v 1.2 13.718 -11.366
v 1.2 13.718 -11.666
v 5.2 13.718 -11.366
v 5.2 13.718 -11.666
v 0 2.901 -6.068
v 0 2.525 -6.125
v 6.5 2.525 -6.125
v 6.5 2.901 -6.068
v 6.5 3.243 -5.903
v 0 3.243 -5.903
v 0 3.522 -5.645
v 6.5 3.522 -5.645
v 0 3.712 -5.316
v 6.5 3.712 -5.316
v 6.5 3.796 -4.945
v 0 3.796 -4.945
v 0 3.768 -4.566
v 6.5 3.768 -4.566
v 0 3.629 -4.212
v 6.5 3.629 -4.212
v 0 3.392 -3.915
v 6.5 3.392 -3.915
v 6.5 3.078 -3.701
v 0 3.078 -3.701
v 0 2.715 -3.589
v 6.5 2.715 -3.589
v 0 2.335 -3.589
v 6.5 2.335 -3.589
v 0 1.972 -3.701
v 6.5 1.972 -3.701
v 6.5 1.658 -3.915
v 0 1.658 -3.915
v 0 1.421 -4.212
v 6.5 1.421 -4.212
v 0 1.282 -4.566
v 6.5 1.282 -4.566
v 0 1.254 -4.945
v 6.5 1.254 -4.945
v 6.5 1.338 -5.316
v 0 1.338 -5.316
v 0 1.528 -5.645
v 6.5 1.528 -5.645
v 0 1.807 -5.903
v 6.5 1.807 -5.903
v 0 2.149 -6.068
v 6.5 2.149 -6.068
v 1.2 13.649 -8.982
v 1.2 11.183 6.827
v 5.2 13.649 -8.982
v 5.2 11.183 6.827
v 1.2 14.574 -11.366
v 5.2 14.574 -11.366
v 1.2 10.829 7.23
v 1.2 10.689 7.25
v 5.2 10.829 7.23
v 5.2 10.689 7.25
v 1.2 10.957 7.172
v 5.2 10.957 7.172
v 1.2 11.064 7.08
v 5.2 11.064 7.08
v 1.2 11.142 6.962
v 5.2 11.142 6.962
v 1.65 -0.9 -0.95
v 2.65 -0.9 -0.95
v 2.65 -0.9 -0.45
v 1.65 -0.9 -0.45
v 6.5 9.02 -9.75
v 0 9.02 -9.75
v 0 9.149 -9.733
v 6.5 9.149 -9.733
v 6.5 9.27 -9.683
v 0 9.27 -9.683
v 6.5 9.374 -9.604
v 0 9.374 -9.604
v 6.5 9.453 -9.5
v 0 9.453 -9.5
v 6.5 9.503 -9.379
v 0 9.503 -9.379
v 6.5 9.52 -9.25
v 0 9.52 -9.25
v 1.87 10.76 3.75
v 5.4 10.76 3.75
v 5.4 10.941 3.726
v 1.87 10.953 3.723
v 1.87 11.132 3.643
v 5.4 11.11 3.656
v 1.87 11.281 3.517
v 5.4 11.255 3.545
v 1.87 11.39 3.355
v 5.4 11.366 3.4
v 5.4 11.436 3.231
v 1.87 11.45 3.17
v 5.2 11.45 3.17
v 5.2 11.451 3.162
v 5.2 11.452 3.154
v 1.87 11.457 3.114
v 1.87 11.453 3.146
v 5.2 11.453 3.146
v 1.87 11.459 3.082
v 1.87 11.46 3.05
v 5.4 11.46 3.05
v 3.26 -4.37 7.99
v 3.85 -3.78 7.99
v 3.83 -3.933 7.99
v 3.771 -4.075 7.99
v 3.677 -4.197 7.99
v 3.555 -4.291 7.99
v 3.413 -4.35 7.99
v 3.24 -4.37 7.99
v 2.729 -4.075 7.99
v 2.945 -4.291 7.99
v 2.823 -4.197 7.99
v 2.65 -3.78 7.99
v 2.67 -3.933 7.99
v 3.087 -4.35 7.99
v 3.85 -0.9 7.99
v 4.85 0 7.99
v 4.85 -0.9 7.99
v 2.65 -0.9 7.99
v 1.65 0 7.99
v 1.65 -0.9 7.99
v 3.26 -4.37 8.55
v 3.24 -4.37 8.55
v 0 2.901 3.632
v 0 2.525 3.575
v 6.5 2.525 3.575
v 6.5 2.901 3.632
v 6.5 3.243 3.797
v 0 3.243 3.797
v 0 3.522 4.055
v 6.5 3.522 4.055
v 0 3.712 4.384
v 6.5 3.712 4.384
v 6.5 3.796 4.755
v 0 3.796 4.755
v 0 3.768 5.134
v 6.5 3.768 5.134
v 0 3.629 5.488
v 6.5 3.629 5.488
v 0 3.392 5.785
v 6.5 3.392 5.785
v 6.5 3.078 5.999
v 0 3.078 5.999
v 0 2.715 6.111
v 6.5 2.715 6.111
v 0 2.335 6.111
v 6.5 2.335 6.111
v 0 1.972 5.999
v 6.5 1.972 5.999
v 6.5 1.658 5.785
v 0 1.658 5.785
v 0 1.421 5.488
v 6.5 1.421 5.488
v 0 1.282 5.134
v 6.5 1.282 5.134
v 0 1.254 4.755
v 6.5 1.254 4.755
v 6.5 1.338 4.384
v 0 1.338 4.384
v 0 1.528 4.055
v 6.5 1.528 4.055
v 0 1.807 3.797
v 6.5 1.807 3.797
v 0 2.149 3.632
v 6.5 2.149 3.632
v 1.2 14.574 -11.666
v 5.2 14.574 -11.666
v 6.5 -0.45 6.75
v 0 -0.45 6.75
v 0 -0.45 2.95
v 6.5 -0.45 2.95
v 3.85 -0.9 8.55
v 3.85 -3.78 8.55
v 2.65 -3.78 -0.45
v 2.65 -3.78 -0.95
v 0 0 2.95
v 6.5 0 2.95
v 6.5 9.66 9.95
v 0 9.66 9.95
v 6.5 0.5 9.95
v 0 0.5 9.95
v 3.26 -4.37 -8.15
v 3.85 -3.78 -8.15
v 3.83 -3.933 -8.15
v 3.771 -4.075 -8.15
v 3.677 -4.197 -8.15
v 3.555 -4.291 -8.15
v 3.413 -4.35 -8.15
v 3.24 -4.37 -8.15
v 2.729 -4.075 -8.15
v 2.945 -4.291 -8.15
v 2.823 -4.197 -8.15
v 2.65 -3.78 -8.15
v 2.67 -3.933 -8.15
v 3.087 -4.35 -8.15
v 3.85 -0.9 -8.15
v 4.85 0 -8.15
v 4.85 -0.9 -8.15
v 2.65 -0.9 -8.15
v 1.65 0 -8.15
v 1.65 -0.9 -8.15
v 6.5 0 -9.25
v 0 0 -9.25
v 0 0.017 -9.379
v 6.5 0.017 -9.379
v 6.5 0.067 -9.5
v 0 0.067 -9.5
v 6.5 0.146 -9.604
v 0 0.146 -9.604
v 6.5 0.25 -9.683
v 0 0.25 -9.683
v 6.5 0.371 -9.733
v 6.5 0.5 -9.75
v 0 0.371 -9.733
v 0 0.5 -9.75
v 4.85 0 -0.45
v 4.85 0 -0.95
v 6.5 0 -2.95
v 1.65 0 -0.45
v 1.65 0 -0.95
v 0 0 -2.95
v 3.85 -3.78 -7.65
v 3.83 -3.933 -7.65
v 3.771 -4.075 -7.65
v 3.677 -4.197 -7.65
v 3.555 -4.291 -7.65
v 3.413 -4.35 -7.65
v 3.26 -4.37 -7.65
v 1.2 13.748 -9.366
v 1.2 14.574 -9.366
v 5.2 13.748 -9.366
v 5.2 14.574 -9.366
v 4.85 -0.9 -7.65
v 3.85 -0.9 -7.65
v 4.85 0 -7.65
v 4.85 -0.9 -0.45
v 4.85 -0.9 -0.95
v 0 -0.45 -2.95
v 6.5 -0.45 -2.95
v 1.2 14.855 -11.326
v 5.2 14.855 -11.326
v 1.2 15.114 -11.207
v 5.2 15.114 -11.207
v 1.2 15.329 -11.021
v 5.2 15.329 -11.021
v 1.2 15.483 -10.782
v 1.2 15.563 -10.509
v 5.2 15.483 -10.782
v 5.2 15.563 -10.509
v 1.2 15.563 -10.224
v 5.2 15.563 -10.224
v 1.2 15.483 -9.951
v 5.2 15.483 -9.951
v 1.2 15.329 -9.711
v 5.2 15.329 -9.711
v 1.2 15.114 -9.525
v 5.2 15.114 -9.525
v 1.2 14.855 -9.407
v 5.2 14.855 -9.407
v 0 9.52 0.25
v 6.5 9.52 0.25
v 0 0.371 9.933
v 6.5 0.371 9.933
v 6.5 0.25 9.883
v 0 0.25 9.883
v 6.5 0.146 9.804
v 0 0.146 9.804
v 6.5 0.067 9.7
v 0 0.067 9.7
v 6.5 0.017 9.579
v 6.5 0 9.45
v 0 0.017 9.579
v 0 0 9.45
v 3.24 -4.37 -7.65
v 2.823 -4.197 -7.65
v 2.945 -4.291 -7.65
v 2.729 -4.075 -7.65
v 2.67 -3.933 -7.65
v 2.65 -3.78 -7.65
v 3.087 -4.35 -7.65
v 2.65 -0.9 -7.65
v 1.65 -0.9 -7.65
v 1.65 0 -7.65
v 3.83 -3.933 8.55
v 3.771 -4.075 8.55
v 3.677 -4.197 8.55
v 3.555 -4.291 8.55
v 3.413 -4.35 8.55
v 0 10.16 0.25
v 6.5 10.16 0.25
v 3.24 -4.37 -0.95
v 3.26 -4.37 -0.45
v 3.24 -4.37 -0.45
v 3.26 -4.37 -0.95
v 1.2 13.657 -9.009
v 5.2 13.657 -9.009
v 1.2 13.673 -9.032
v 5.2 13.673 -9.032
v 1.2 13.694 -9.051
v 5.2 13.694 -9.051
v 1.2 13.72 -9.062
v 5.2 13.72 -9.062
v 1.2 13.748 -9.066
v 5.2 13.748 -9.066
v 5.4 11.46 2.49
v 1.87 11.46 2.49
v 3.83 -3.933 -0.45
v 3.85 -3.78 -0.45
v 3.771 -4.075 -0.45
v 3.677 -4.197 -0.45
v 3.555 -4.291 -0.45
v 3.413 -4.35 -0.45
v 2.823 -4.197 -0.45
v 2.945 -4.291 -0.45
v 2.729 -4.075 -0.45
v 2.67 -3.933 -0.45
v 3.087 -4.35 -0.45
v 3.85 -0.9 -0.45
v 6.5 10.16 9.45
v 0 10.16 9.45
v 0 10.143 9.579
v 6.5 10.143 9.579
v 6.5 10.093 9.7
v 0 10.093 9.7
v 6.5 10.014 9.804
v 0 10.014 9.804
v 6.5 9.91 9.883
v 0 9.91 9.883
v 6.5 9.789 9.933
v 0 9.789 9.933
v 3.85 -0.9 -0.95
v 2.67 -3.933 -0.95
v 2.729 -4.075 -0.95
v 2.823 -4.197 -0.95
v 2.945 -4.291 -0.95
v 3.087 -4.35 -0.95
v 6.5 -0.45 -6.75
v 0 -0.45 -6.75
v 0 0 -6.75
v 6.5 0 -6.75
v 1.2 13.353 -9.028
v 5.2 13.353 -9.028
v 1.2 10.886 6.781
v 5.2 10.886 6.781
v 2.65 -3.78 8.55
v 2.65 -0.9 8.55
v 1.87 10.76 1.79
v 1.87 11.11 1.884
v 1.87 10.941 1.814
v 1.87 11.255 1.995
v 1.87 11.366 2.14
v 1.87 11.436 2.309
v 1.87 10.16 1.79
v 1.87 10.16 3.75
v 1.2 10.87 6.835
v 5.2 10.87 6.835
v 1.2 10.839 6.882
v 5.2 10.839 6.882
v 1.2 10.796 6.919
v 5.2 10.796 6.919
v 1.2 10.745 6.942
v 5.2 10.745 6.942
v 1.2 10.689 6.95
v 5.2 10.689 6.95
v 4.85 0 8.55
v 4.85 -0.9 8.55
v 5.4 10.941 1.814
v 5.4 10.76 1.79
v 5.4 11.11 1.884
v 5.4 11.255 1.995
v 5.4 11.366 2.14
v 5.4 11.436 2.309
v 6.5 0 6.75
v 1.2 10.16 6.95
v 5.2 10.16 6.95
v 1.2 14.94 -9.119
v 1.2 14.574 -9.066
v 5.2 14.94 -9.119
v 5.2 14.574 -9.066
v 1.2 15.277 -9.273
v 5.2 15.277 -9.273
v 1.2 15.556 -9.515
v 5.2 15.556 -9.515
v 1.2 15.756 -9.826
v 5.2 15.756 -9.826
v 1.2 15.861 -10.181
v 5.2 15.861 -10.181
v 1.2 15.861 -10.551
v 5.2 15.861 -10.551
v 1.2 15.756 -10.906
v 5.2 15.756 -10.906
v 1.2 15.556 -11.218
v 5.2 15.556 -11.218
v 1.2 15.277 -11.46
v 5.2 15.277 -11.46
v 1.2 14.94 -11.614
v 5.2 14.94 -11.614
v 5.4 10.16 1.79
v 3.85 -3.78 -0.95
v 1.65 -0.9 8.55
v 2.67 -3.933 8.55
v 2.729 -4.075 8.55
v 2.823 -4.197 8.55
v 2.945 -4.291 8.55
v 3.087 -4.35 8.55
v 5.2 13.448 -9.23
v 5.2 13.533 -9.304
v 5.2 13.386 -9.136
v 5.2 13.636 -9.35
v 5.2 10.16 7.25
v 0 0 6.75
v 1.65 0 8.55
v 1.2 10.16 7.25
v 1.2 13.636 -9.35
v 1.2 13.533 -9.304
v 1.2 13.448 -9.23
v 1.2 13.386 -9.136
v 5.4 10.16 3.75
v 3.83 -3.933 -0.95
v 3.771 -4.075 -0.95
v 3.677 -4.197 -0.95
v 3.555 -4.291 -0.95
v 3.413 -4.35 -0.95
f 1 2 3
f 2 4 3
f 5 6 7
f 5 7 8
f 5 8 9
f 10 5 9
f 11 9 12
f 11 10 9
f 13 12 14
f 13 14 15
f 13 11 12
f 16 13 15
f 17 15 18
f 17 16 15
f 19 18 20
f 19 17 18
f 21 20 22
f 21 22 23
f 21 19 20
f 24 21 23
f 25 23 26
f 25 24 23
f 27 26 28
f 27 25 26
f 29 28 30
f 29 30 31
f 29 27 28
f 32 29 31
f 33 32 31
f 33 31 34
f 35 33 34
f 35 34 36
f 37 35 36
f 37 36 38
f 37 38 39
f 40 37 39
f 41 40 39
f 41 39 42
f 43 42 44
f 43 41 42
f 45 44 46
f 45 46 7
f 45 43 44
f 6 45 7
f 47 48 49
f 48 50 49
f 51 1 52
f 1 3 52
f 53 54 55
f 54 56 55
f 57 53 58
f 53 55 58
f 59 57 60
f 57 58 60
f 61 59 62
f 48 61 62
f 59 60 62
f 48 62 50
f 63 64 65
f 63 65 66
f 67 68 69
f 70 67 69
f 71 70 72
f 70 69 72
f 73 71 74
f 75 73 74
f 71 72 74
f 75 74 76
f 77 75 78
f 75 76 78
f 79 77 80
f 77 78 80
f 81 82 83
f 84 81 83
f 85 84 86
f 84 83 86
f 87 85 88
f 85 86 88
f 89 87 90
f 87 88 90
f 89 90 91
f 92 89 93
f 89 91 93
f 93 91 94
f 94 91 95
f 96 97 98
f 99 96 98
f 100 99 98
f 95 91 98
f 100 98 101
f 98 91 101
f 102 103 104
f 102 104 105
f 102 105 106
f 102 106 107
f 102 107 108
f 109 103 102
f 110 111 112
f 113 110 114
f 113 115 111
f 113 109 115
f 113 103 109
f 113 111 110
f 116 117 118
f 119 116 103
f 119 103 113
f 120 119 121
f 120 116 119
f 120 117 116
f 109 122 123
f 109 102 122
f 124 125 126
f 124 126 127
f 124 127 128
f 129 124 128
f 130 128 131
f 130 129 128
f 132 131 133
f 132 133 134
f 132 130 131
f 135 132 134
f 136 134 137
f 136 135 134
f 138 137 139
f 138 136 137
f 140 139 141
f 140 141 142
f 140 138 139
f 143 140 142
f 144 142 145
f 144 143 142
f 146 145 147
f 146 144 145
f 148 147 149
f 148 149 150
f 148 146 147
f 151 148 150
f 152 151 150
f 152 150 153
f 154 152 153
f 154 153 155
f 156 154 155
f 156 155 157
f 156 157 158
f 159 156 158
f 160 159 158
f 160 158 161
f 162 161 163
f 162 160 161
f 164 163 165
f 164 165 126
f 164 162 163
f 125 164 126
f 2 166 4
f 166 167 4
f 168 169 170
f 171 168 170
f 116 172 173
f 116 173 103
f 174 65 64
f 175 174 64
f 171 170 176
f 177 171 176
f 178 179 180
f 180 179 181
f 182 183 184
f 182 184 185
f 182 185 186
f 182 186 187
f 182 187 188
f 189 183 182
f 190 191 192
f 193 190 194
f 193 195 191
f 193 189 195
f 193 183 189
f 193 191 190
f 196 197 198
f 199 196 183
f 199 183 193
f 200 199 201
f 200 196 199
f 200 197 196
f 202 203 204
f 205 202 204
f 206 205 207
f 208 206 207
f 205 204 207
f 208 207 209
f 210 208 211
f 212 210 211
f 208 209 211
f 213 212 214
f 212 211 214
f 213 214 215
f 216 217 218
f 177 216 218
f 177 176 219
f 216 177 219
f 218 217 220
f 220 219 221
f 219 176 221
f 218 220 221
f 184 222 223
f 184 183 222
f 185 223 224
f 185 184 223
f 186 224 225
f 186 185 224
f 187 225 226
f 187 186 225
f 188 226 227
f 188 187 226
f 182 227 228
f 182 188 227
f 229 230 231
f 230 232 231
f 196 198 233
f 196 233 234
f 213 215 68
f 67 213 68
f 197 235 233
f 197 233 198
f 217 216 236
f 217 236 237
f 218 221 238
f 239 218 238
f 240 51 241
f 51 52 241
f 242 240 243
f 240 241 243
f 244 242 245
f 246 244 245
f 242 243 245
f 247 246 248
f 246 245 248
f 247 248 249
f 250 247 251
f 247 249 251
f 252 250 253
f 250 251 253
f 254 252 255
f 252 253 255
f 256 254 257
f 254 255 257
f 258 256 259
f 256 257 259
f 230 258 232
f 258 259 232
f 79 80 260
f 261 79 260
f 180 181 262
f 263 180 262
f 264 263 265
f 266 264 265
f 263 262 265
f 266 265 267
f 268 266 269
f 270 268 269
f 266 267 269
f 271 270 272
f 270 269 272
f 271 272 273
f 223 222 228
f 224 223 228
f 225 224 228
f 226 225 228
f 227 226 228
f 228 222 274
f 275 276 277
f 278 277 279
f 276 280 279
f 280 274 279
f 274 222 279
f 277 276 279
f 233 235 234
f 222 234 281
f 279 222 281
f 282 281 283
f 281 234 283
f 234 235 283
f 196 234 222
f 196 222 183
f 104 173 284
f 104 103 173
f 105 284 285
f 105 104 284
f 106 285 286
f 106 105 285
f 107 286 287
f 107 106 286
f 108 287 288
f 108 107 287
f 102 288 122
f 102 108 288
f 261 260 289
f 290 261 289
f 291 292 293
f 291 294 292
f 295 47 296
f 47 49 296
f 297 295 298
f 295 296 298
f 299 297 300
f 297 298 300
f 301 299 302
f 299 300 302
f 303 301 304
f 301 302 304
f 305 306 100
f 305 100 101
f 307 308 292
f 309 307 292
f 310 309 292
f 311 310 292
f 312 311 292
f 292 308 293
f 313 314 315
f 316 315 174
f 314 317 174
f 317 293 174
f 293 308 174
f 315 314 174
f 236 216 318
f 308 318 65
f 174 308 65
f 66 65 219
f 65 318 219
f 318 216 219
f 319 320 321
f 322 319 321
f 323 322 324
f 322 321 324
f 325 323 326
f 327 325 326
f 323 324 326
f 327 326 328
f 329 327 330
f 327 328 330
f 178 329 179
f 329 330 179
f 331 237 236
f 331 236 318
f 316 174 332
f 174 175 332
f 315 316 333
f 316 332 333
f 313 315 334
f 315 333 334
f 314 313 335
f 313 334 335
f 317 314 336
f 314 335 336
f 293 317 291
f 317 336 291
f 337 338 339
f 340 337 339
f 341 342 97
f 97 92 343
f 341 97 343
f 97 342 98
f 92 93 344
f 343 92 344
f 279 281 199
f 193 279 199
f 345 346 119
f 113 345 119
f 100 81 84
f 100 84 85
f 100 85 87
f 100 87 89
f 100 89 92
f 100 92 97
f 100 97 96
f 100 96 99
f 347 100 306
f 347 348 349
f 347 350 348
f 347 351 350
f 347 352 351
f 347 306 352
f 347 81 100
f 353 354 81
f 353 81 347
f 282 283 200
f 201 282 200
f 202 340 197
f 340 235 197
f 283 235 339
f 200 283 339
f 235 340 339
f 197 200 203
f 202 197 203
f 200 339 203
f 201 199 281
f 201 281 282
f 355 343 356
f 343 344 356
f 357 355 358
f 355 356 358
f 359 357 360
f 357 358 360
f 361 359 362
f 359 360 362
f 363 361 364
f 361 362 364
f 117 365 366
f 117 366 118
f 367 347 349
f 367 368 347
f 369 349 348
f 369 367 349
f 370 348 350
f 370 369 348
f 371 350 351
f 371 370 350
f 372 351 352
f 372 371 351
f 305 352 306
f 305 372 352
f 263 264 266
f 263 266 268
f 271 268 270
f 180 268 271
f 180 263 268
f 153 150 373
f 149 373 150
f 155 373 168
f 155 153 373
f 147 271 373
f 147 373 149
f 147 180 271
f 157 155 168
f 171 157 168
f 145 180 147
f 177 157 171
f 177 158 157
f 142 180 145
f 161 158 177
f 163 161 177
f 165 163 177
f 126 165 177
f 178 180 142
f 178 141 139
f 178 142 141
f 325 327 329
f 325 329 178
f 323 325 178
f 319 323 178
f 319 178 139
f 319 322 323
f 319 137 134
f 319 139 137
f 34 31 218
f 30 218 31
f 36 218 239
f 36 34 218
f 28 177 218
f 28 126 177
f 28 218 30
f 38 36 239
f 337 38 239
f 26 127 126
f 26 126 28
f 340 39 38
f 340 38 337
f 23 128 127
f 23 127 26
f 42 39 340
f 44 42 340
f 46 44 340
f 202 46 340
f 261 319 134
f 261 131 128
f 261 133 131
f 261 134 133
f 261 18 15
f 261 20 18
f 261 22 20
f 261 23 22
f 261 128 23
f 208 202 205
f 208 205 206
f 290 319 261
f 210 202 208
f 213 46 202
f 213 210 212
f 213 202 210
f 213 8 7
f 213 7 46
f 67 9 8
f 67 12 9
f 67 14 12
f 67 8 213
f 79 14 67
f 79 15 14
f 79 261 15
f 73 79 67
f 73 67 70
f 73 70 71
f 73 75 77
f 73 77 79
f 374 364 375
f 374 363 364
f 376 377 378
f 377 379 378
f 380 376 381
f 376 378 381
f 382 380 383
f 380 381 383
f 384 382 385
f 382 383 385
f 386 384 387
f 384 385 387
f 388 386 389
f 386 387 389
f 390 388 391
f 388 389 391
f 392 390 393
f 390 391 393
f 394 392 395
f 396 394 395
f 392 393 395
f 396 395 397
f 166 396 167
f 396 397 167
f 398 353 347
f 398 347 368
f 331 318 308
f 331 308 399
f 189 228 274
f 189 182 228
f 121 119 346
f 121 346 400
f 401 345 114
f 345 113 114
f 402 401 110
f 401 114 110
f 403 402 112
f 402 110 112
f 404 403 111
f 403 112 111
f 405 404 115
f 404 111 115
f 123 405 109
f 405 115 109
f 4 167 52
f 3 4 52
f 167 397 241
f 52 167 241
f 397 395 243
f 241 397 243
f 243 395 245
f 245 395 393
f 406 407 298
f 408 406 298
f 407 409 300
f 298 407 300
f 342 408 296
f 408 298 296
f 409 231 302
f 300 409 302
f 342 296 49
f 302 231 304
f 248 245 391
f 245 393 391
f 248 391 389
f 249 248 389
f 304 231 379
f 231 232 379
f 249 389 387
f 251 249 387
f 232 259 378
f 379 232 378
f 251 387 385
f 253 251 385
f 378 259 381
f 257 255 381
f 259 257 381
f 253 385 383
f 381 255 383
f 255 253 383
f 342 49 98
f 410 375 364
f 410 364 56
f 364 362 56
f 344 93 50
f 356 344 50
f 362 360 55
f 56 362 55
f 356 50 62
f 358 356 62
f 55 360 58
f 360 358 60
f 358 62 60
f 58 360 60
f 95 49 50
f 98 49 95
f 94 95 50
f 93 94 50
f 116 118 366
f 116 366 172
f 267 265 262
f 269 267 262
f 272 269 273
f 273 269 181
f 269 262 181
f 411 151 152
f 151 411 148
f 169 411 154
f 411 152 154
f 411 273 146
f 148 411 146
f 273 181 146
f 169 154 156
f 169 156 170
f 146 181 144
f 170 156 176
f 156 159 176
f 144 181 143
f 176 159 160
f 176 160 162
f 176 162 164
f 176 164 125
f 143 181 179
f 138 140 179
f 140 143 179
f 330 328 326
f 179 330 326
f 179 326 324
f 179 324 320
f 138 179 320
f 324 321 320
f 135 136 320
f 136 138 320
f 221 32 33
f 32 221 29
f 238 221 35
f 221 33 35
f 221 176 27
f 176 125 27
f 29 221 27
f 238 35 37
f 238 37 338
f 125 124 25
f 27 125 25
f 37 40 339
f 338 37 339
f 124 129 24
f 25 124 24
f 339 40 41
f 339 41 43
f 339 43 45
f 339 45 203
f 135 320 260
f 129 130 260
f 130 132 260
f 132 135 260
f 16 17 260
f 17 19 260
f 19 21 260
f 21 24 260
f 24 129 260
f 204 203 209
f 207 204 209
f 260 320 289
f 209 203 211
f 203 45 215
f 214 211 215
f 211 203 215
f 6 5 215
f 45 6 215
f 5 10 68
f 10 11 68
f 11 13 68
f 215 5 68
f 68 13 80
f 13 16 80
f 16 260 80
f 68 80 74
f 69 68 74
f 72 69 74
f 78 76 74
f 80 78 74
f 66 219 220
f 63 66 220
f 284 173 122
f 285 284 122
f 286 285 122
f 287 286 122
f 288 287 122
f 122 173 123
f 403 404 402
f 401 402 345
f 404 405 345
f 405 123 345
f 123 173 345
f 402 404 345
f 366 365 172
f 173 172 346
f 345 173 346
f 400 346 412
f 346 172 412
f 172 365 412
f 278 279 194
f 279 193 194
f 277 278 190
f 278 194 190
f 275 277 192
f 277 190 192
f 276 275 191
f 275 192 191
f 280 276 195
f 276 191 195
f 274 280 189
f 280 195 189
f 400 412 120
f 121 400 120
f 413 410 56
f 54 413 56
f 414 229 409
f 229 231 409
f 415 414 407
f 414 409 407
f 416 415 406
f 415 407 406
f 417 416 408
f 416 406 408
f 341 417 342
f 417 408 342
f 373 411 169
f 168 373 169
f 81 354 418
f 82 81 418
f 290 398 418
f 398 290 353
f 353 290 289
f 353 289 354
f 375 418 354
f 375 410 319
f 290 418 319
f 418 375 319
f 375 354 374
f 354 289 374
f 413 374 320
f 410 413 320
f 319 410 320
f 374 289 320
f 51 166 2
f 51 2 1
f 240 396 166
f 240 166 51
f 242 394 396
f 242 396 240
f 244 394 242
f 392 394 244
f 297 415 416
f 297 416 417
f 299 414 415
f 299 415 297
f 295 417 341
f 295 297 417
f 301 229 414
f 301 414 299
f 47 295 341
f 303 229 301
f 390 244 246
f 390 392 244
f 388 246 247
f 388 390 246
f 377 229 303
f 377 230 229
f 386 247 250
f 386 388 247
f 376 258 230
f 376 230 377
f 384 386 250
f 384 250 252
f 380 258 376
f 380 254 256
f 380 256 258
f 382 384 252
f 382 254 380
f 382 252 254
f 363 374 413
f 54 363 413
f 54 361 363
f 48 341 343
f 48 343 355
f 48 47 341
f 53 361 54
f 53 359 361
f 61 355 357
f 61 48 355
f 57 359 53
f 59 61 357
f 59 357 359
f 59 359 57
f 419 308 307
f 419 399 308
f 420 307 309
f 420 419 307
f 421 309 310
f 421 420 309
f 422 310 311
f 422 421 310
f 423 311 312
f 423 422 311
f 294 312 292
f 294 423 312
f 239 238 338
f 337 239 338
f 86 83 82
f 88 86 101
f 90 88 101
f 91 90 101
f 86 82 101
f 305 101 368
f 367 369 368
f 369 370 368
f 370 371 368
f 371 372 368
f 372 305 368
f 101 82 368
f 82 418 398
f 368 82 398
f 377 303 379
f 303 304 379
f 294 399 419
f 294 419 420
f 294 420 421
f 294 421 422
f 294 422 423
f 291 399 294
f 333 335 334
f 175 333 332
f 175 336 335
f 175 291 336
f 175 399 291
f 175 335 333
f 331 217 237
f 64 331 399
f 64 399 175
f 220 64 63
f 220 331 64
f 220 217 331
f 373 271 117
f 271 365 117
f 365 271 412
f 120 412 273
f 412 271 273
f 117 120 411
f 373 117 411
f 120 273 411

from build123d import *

# Parameters (mm, degrees)
SKETCH1_R               = 1.275
BOSS_EXTRUDE1_DEPTH     = 6.5
SKETCH2_W               = 3.53
SKETCH2_H               = 1.96
BOSS_EXTRUDE2_DEPTH     = 1.3
FILLET1_R               = 0.7
SKETCH3_W               = 3.2
SKETCH3_H               = 0.56
SKETCH3_H_2             = 0.5
BOSS_EXTRUDE3_DEPTH     = 0.9
SKETCH4_W               = 1.2
SKETCH4_H               = 0.56
SKETCH4_H_2             = 0.5
BOSS_EXTRUDE4_DEPTH     = 3.47
FILLET2_R               = 0.59
EXTRU_MINCE1_DEPTH      = 2
EXTRU_MINCE1_DEPTH_BACK = 2


with BuildPart() as part:
    # Sketch1 → Boss-Extrude1 (new body)
    with BuildSketch(Plane(origin=(0, 0, 0), x_dir=(0, 0, -1), z_dir=(1, 0, 0))):
        with BuildLine():
            Line((-9.45, 0), (-6.75, 0))
            Line((-6.75, 0), (-6.75, -0.45))
            Line((-6.75, -0.45), (-2.95, -0.45))
            Line((-2.95, -0.45), (-2.95, 0))
            Line((-2.95, 0), (2.95, 0))
            Line((2.95, 0), (2.95, -0.45))
            Line((2.95, -0.45), (6.75, -0.45))
            Line((6.75, -0.45), (6.75, 0))
            Line((6.75, 0), (9.25, 0))
            ThreePointArc((9.25, 0), (9.603553391, 0.146446609), (9.75, 0.5))
            Line((9.75, 0.5), (9.75, 9.02))
            ThreePointArc((9.75, 9.02), (9.603553391, 9.373553391), (9.25, 9.52))
            Line((9.25, 9.52), (-0.25, 9.52))
            Line((-0.25, 9.52), (-0.25, 10.16))
            Line((-0.25, 10.16), (-9.45, 10.16))
            ThreePointArc((-9.45, 10.16), (-9.803553391, 10.013553391), (-9.95, 9.66))
            Line((-9.95, 9.66), (-9.95, 0.5))
            ThreePointArc((-9.95, 0.5), (-9.803553391, 0.146446609), (-9.45, 0))
        make_face()
        with Locations((-4.85, 2.525)):
            Circle(SKETCH1_R, mode=Mode.SUBTRACT)
        with Locations((4.85, 2.525)):
            Circle(SKETCH1_R, mode=Mode.SUBTRACT)
    extrude(amount=BOSS_EXTRUDE1_DEPTH)

    # Sketch2 → Boss-Extrude2 (add)
    with BuildSketch(Plane(origin=(0, 10.16, 0), x_dir=(1, 0, 0), z_dir=(0, 1, 0))):
        with Locations((3.635, -2.77)):
            Rectangle(SKETCH2_W, SKETCH2_H)
    extrude(amount=BOSS_EXTRUDE2_DEPTH)

    # Fillet1
    fillet1_edges = [part.edges().sort_by_distance(p)[0] for p in [
        (3.635, 11.46, 3.75),
        (3.635, 11.46, 1.79),
    ]]
    fillet(fillet1_edges, radius=FILLET1_R)

    # Sketch3 → Boss-Extrude3 (add)
    with BuildSketch(Plane(origin=(0, 0, 0), x_dir=(-1, 0, 0), z_dir=(0, -1, 0))):
        with Locations((-3.25, -8.27)):
            Rectangle(SKETCH3_W, SKETCH3_H)
        with Locations((-3.25, 0.7)):
            Rectangle(SKETCH3_W, SKETCH3_H_2)
        with Locations((-3.25, 7.9)):
            Rectangle(SKETCH3_W, SKETCH3_H_2)
    extrude(amount=BOSS_EXTRUDE3_DEPTH)

    # Sketch4 → Boss-Extrude4 (add)
    with BuildSketch(Plane(origin=(0, -0.9, 0), x_dir=(-1, 0, 0), z_dir=(0, -1, 0))):
        with Locations((-3.25, -8.27)):
            Rectangle(SKETCH4_W, SKETCH4_H)
        with Locations((-3.25, 0.7)):
            Rectangle(SKETCH4_W, SKETCH4_H_2)
        with Locations((-3.25, 7.9)):
            Rectangle(SKETCH4_W, SKETCH4_H_2)
    extrude(amount=BOSS_EXTRUDE4_DEPTH)

    # Fillet2
    fillet2_edges = [part.edges().sort_by_distance(p)[0] for p in [
        (2.65, -4.37, 8.27),
        (3.85, -4.37, 8.27),
        (2.65, -4.37, -0.7),
        (3.85, -4.37, -0.7),
        (3.85, -4.37, -7.9),
        (2.65, -4.37, -7.9),
    ]]
    fillet(fillet2_edges, radius=FILLET2_R)

    # Esquisse1 → Extru.-Mince1 (add, two sides)
    with BuildSketch(Plane(origin=(3.2, 0, 0), x_dir=(0, 0, -1), z_dir=(1, 0, 0))) as extru_mince1_sk:
        with BuildLine():
            Line((-7.25, 10.16), (-7.25, 10.688783991))
            ThreePointArc((-7.25, 10.688783991), (-7.129827698, 11.013946904), (-6.82707632, 11.182807513))
            Line((-6.82707632, 11.182807513), (8.981676404, 13.649249751))
            ThreePointArc((8.981676404, 13.649249751), (9.04222668, 13.683021873), (9.06626114, 13.748054456))
            Line((9.06626114, 13.748054456), (9.06626114, 14.573737504))
            ThreePointArc((9.06626114, 14.573737504), (10.36626114, 15.873737504), (11.66626114, 14.573737504))
            Line((11.66626114, 14.573737504), (11.66626114, 13.717657457))
            Line((11.66626114, 13.717657457), (11.36616114, 13.717657457))
            Line((11.36616114, 13.717657457), (11.36616114, 14.573737504))
            ThreePointArc((11.36616114, 14.573737504), (10.36626114, 15.573637504), (9.36636114, 14.573737504))
            Line((9.36636114, 14.573737504), (9.36636114, 13.748054456))
            ThreePointArc((9.36636114, 13.748054456), (9.270199264, 13.487859093), (9.027937611, 13.352736833))
            Line((9.027937611, 13.352736833), (-6.780815113, 10.886294595))
            ThreePointArc((-6.780815113, 10.886294595), (-6.901855114, 10.818784123), (-6.9499, 10.688783991))
            Line((-6.9499, 10.688783991), (-6.9499, 10.16))
            Line((-6.9499, 10.16), (-7.25, 10.16))
        make_face()
    extrude(amount=EXTRU_MINCE1_DEPTH)
    extrude(extru_mince1_sk.sketch, amount=-EXTRU_MINCE1_DEPTH_BACK)


solid = part.part
